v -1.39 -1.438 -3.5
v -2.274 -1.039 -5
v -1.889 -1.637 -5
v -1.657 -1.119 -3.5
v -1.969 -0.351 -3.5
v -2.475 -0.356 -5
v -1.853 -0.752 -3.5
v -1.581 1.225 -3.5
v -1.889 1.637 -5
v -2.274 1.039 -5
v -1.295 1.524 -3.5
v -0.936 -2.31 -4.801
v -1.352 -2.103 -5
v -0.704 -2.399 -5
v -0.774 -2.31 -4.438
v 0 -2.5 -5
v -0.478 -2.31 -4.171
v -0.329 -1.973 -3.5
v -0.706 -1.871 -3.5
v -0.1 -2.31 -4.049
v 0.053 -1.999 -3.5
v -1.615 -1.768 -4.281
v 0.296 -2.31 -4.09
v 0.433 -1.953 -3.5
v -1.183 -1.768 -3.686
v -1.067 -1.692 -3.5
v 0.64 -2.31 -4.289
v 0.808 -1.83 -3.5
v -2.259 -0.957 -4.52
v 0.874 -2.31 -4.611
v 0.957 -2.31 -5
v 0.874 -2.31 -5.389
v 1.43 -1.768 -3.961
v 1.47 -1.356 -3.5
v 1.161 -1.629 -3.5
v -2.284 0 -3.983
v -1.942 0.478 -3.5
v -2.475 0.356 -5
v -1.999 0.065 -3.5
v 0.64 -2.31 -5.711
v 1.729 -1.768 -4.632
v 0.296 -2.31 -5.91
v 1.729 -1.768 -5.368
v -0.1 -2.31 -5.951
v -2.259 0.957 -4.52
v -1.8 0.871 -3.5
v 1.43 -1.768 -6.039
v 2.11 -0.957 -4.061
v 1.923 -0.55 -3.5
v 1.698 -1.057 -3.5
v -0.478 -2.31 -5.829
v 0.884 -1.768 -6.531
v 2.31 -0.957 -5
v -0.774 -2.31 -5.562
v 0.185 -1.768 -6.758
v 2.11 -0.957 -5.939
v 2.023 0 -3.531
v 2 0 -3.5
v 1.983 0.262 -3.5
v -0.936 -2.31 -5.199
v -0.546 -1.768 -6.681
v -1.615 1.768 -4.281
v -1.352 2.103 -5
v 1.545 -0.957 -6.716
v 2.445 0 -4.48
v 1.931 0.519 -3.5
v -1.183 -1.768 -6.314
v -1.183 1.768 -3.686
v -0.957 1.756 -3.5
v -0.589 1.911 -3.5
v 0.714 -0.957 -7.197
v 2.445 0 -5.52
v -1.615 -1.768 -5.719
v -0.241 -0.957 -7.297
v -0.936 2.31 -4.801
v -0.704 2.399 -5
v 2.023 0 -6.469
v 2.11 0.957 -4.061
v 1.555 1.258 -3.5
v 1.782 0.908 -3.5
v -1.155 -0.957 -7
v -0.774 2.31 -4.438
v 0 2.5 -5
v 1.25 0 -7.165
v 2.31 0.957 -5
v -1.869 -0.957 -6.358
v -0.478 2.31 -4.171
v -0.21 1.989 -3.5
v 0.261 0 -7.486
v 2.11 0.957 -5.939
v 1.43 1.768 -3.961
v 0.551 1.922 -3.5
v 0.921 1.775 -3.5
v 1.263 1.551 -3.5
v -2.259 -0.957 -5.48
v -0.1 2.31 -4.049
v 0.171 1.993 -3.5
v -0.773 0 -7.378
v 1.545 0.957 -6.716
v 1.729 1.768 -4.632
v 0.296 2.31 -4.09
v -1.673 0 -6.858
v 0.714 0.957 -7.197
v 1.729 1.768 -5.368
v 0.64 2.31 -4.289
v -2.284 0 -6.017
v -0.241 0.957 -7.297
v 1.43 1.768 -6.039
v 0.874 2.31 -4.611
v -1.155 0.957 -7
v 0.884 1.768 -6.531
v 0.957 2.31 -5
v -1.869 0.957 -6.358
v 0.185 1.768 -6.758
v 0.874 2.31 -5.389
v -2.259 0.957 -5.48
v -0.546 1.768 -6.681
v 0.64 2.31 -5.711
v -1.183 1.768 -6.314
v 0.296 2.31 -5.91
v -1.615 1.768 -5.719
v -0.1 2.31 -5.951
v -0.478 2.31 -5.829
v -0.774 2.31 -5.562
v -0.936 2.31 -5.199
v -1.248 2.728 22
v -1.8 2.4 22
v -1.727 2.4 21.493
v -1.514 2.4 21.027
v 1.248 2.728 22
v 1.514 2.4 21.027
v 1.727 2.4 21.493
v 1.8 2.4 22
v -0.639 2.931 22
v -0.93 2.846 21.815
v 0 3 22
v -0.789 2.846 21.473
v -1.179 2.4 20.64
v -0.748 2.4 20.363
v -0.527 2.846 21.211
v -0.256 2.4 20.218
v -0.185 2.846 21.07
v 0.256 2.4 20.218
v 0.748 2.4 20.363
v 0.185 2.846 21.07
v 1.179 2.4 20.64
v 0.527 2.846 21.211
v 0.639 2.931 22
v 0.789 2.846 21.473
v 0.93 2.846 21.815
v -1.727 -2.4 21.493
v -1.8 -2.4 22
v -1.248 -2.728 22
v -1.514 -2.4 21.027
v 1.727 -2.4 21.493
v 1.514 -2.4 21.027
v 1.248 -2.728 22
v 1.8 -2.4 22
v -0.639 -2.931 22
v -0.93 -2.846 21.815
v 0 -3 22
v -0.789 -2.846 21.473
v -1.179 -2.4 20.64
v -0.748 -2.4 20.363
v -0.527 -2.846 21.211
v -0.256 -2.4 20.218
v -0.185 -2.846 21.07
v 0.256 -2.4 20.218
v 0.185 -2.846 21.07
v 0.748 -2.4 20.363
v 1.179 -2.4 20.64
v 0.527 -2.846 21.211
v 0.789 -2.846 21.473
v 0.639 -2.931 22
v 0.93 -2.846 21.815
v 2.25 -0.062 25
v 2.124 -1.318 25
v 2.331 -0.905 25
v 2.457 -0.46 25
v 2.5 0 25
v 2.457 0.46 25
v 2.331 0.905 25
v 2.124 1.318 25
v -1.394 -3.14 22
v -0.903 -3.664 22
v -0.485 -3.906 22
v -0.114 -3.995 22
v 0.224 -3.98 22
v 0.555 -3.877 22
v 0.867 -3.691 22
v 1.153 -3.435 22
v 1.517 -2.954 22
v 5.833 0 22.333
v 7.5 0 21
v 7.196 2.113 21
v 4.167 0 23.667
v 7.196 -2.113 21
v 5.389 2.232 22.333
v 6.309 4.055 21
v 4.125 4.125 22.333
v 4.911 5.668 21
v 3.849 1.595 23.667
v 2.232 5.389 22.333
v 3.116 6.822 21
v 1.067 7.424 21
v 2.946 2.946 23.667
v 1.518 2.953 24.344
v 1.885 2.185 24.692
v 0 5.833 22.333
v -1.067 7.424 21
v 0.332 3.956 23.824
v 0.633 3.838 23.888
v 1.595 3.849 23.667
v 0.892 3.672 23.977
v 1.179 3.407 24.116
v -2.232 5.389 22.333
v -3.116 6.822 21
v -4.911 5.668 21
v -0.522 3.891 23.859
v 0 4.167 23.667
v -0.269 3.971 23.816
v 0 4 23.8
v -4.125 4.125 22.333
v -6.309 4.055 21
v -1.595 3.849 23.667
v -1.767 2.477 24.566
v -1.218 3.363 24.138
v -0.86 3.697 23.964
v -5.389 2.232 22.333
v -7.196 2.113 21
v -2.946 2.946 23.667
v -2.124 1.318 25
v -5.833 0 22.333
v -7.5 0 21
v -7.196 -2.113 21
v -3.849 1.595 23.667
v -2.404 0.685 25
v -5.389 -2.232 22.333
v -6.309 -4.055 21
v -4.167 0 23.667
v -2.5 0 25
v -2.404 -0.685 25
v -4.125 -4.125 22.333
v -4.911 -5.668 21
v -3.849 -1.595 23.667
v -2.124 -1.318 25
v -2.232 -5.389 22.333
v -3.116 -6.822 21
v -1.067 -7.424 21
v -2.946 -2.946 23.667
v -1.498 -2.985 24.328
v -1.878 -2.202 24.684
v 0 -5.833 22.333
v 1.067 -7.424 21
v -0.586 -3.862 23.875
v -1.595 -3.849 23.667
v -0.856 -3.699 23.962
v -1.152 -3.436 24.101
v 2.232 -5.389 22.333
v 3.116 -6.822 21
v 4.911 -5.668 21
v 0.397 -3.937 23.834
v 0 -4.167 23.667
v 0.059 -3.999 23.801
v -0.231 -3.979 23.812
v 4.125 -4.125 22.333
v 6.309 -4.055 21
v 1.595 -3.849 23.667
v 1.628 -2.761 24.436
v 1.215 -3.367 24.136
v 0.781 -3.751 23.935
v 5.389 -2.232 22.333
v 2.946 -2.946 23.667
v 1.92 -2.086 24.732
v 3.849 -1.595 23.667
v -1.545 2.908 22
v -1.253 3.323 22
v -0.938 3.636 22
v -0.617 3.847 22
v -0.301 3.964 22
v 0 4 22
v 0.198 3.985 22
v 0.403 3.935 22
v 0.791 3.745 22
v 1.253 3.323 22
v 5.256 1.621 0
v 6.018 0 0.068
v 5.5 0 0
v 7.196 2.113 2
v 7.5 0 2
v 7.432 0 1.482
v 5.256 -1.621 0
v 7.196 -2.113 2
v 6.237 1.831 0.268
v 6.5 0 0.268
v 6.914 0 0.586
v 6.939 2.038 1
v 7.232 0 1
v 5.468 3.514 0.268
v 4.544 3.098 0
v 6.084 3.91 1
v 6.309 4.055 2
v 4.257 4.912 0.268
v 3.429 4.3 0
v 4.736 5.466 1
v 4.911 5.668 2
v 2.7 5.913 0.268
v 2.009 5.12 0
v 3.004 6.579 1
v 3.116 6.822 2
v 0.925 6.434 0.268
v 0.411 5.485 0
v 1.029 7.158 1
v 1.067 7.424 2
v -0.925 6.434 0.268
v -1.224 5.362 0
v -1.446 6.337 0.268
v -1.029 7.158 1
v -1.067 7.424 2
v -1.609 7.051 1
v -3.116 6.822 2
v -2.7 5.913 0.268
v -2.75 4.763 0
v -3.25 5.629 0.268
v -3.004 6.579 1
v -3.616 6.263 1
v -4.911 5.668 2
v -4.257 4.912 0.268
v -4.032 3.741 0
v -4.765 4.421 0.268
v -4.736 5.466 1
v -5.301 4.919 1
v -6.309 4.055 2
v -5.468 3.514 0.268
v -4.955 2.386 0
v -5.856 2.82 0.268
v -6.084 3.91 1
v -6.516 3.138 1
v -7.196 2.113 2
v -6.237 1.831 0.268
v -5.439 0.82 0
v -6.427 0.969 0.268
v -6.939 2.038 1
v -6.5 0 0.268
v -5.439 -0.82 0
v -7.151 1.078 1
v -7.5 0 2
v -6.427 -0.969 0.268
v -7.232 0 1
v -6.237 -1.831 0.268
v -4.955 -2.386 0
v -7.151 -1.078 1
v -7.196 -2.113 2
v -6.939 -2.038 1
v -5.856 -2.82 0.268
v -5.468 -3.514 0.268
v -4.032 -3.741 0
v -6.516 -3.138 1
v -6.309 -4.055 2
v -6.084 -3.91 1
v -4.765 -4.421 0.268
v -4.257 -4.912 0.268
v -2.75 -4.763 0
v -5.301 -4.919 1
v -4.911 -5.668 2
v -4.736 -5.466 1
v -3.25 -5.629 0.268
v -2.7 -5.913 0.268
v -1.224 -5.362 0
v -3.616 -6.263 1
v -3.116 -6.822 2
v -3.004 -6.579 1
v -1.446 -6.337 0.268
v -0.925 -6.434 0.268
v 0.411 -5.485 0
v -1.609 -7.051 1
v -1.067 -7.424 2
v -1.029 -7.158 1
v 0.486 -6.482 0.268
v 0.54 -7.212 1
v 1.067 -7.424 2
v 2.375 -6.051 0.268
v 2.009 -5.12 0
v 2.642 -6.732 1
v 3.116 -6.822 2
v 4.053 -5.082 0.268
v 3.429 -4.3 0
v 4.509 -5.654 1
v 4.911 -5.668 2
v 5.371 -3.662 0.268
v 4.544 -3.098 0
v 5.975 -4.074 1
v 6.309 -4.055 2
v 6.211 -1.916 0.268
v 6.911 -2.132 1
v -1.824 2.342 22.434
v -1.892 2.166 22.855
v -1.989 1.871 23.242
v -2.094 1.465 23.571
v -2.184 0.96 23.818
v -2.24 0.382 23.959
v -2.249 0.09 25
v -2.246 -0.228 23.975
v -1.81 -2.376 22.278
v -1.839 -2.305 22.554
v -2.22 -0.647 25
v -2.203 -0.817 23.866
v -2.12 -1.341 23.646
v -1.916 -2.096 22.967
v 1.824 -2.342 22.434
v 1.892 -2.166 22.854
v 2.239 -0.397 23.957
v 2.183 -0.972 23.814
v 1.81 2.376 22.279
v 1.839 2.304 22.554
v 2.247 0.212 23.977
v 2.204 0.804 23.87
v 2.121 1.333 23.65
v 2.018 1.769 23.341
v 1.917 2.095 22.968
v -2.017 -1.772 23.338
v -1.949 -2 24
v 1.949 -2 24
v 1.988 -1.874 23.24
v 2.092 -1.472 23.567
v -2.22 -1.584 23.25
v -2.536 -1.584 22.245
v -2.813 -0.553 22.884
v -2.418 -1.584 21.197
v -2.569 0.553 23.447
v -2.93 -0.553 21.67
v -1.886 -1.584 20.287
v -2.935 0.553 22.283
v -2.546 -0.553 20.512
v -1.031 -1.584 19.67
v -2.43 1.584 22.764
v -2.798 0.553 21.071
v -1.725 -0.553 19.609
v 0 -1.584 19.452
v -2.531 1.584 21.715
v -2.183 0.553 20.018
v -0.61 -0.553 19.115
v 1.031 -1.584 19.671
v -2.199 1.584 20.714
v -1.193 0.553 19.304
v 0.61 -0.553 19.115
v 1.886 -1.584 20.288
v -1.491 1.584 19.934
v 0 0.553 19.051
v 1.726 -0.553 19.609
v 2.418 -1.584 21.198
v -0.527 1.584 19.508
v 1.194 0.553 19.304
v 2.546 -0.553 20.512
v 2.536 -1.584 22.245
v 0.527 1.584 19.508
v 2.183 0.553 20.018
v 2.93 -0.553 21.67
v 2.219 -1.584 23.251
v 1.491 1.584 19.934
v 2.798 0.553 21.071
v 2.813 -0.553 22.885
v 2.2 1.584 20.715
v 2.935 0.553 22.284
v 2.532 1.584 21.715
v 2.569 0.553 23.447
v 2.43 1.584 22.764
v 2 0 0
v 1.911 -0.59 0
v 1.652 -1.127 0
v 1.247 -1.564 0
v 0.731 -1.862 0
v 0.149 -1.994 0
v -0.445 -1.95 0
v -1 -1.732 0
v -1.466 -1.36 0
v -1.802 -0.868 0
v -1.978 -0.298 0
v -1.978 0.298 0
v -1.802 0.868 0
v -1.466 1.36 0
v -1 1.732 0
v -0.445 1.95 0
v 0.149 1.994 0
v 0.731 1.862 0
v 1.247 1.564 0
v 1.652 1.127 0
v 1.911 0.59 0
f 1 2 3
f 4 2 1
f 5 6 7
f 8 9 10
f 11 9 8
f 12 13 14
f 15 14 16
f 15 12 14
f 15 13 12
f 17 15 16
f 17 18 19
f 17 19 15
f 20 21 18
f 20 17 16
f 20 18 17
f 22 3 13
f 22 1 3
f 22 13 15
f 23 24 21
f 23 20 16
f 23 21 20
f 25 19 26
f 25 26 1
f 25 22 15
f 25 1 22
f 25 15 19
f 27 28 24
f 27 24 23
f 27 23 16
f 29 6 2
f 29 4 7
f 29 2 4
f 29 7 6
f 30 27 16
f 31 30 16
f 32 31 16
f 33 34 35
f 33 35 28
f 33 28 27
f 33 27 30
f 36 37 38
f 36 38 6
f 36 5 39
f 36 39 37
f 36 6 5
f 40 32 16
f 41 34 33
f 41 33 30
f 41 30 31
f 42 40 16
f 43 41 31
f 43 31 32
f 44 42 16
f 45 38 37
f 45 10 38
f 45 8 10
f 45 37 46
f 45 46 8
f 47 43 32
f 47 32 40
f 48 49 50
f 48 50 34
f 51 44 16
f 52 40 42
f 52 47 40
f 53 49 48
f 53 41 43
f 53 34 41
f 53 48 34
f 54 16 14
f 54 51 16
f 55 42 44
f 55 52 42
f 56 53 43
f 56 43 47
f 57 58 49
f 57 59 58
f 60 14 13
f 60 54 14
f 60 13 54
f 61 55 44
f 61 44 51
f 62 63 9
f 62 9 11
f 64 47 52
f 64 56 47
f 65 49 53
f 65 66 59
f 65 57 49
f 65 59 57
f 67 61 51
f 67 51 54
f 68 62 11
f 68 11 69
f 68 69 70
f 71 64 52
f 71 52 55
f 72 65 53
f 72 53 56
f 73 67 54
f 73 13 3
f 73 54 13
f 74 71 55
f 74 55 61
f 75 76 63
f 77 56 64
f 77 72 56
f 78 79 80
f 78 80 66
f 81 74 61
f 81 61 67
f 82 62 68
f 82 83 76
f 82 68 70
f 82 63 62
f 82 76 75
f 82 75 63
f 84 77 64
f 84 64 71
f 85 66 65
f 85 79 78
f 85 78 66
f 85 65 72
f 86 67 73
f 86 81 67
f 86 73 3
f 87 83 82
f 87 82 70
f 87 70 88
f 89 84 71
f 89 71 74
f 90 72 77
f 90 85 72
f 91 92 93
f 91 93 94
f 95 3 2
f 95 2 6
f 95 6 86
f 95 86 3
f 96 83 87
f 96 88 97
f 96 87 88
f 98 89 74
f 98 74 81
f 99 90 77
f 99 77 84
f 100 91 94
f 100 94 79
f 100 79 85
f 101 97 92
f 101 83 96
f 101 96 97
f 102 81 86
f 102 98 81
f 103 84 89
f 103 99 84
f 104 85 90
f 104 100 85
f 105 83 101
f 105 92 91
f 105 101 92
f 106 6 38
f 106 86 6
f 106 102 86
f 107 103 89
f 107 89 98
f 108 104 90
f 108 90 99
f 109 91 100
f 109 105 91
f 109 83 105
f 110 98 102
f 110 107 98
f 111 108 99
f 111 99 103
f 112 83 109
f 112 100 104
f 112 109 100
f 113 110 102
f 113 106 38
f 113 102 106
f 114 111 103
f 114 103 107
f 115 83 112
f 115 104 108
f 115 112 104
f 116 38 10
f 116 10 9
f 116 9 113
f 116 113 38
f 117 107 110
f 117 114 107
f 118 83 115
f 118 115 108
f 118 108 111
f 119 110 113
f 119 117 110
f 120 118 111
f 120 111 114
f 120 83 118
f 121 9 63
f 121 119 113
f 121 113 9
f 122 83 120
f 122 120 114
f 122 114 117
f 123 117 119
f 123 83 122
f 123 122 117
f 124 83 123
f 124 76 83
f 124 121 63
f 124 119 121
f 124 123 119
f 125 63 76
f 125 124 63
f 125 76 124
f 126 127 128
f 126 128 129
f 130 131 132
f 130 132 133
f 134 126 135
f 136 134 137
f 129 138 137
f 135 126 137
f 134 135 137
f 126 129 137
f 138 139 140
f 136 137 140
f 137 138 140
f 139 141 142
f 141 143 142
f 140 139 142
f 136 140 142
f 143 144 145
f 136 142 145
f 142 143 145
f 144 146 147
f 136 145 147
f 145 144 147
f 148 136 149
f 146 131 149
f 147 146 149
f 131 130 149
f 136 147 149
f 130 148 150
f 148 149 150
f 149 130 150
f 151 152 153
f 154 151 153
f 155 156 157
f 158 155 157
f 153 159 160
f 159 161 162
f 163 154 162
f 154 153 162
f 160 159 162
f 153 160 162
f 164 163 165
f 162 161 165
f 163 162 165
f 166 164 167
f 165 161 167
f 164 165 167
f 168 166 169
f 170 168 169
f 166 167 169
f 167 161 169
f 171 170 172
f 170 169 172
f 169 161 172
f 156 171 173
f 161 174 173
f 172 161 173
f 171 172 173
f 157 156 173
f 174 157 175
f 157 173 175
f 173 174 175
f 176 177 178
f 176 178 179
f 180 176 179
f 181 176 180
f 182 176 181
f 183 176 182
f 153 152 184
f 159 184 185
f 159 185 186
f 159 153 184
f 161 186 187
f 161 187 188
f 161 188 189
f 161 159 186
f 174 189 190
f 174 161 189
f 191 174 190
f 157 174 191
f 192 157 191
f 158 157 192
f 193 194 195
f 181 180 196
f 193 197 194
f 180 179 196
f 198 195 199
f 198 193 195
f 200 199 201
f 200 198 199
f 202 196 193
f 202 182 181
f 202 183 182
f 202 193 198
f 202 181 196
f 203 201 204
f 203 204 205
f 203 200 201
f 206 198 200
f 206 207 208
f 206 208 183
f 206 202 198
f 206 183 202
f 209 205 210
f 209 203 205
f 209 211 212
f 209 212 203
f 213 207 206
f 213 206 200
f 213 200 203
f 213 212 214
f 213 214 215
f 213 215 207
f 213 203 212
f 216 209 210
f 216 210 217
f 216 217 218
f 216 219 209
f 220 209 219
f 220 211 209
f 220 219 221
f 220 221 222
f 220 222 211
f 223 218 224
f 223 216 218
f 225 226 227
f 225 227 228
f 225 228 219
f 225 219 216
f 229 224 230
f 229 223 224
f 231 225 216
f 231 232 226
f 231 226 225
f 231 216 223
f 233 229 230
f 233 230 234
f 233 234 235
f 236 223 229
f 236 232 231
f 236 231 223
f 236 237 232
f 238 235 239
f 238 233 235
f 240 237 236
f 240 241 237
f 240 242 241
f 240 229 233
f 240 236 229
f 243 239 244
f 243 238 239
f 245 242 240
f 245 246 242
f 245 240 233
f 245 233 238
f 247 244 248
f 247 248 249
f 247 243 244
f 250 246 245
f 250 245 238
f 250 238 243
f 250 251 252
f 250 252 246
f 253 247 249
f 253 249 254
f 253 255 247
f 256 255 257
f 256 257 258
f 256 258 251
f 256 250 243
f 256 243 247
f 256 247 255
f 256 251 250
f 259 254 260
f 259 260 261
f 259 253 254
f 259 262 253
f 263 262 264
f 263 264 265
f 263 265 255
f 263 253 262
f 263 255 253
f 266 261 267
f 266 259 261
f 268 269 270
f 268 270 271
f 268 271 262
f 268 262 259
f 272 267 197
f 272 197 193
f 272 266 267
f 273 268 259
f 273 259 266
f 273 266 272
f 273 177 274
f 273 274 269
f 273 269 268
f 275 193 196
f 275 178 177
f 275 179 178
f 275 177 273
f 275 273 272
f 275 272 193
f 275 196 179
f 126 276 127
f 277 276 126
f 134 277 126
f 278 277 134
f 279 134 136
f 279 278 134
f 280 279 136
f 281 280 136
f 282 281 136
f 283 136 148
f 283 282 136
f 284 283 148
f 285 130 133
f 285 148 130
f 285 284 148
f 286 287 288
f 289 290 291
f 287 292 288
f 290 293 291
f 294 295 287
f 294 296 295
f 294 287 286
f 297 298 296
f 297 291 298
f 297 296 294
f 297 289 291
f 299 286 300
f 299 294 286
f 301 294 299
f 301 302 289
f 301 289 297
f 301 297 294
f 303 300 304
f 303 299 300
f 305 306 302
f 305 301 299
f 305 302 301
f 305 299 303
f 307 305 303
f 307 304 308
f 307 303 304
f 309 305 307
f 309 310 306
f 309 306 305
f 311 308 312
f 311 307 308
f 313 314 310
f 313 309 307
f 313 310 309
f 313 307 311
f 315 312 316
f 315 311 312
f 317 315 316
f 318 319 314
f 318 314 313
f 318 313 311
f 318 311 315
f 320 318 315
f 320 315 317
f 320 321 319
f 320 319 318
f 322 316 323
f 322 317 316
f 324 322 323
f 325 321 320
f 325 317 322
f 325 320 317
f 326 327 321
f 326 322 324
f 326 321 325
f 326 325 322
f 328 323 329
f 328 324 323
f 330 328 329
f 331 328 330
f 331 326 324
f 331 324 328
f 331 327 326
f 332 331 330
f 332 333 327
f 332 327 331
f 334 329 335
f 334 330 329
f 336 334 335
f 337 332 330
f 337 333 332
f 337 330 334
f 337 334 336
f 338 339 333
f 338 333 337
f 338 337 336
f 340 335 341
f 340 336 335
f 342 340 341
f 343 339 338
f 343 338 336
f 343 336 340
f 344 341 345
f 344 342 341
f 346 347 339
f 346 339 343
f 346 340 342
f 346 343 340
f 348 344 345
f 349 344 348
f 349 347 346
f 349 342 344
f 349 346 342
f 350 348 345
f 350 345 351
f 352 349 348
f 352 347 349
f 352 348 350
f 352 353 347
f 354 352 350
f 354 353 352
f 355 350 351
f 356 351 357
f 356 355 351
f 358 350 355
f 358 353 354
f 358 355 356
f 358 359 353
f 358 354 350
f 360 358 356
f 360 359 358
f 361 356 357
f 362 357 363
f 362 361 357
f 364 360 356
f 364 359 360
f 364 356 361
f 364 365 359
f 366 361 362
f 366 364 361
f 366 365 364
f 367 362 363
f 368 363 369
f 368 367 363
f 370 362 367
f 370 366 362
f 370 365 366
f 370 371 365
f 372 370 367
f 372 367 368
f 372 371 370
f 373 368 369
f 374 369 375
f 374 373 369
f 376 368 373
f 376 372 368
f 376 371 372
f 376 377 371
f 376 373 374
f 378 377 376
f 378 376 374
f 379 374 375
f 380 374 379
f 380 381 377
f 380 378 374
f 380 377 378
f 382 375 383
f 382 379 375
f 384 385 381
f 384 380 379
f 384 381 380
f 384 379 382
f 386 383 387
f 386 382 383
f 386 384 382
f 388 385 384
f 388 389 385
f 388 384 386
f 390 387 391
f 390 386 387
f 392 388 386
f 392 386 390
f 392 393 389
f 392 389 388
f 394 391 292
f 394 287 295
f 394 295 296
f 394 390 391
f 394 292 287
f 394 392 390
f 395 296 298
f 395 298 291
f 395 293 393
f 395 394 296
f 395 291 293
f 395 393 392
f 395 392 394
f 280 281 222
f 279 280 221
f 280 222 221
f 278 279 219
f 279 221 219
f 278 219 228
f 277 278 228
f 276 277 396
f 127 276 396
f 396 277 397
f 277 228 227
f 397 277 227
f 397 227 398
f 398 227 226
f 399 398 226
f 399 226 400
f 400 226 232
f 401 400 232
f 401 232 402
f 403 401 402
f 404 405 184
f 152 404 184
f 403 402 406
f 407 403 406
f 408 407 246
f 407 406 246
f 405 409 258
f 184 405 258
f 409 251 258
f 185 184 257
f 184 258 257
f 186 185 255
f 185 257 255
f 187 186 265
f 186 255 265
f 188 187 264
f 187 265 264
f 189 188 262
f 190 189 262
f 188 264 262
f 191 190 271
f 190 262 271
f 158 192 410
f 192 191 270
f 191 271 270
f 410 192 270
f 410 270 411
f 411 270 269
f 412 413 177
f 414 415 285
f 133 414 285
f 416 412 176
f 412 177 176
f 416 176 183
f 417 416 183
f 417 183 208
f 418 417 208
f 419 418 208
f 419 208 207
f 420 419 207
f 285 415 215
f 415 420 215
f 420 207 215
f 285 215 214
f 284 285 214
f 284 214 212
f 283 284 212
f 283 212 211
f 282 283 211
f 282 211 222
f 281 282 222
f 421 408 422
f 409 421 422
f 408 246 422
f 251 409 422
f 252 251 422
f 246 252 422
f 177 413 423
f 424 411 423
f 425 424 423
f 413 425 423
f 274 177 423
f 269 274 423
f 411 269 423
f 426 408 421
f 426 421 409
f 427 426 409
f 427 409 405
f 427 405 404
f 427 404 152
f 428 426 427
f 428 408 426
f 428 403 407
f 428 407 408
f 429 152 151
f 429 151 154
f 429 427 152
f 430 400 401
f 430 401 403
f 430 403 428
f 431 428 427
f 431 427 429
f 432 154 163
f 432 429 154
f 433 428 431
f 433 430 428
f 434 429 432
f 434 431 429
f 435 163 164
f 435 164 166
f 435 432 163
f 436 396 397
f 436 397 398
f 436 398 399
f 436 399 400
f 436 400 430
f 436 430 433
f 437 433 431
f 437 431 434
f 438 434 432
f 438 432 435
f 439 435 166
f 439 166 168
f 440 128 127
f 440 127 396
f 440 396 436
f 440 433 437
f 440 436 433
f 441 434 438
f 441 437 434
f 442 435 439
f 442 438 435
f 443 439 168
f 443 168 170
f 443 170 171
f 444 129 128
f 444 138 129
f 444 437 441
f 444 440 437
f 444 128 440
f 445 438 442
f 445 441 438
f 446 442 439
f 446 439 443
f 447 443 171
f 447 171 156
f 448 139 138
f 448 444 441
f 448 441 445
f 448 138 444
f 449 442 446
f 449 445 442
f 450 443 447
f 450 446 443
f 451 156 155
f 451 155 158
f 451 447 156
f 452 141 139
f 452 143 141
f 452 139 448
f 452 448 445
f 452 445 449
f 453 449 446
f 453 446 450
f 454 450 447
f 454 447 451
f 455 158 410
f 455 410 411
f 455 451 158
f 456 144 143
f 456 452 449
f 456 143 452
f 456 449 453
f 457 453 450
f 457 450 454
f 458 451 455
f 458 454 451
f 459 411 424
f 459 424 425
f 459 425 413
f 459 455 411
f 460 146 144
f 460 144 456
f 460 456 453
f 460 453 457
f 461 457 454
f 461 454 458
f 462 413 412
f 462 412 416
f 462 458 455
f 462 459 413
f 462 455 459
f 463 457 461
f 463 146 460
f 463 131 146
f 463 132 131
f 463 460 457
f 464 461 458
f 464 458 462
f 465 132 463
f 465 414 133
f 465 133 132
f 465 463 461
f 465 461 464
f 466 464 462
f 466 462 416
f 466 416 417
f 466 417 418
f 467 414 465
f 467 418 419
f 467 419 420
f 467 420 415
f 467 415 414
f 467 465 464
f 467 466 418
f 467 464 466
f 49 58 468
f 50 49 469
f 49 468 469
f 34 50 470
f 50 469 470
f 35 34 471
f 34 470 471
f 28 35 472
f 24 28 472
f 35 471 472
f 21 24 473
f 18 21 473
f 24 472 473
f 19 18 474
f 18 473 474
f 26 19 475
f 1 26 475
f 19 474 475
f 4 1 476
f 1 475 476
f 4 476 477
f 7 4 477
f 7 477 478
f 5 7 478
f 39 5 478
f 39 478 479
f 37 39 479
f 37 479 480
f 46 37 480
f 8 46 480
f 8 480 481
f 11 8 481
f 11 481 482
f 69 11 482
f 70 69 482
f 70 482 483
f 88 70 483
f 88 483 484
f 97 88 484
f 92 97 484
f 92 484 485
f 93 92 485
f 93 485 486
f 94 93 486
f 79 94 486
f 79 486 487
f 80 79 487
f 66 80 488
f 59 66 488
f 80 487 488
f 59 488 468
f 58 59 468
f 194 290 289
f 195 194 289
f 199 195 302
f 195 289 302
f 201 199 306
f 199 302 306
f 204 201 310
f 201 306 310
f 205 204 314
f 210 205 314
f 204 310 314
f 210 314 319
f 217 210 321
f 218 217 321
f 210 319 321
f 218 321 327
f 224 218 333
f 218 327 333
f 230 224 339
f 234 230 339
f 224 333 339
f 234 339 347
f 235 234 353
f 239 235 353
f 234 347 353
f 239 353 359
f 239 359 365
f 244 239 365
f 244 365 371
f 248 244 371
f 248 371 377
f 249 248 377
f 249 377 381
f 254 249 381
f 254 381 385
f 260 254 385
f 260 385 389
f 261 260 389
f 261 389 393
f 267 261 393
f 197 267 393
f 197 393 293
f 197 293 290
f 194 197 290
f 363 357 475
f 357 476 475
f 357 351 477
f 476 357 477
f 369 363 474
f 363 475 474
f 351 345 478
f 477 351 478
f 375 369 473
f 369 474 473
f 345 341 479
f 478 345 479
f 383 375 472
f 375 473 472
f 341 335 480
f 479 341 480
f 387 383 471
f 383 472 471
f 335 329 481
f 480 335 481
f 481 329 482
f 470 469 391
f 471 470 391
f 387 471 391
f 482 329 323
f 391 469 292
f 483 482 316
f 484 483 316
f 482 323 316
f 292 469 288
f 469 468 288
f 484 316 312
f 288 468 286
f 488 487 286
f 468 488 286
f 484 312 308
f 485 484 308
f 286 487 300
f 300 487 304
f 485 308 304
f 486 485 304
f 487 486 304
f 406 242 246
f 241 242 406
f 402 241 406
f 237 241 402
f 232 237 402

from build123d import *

# Parameters (mm, degrees)
F0_R     = 7.5
F1_DEPTH = 25
F2_R     = 2
F3_DEPTH = 5
F7_DEPTH = 3
F11_R    = 2


# Not quite as in the source:
# - a fillet or chamfer that OpenCascade refuses, or shapes differently, is made with other operations: its cross-section is extruded or revolved along the edge and cut away or added


with BuildPart() as f1:
    # F0 (on Top) → F1 (new body)
    with BuildSketch(Plane.XY):
        Circle(F0_R)
    extrude(amount=F1_DEPTH)

    # F2 (on face) → F3 (join)
    with BuildSketch(Plane(origin=(0, 0, 0), x_dir=(1, 0, 0), z_dir=(0, 0, -1))):
        Circle(F2_R)
    extrude(amount=F3_DEPTH)

    # F4 (on face) → F5 (revolve)
    with BuildSketch(Plane(origin=(0, 0, -5), x_dir=(1, 0, 0), z_dir=(0, 0, -1))):
        with BuildLine():
            Line((0, 2), (0, 2.5))
            ThreePointArc((0, 2.5), (-2.5, 0), (0, -2.5))
            Line((0, -2.5), (0, -2))
            ThreePointArc((0, -2), (-2, 0), (0, 2))
        make_face()
        with BuildLine():
            Line((0, -2), (0, 2))
            ThreePointArc((0, 2), (-2, 0), (0, -2))
        make_face()
    revolve(axis=Axis((0, 0, -5), (0, 1, 0)))

    # F6 (on face) → F7 (cut)
    with BuildSketch(Plane.XY.offset(25)):
        with BuildLine():
            add(Edge.make_bspline(
                [(0, 4), (-3.897114317, 4), (-1.9485571585, -2), (0, -8), (1.9485571585, -2), (3.897114317, 4), (0, 4)],
                knots=[0, 0, 0, 2.0943951024, 2.0943951024, 4.1887902048, 4.1887902048, 6.2831853072, 6.2831853072, 6.2831853072], degree=2, weights=[1, 0.5, 1, 0.5, 1, 0.5, 1]))
        make_face()
    extrude(amount=-F7_DEPTH, mode=Mode.SUBTRACT)

    # F8 (on face) → F9 (revolve, cut)
    with BuildSketch(Plane.XY.offset(22)):
        with BuildLine():
            ThreePointArc((1.8, -2.4), (2.683281573, -1.3416407865), (3, 0))
            ThreePointArc((3, 0), (2.683281573, 1.3416407865), (1.8, 2.4))
            add(Edge.make_bspline(
                [(1.8, -2.4), (1.8810311774, -2.2079260981), (1.9485571585, -2), (2.6913429511, 0.2871870789), (1.8, 2.4)],
                knots=[4.0484923357, 4.0484923357, 4.0484923357, 4.1887902048, 4.1887902048, 5.3448576064, 5.3448576064, 5.3448576064], degree=2, weights=[0.9375, 0.9665063509, 1, 0.7240092377, 0.7527020789]))
        make_face()
        with BuildLine():
            Line((0, -3), (0, 3))
            ThreePointArc((0, 3), (-0.9486832981, 2.8460498942), (-1.8, 2.4))
            add(Edge.make_bspline(
                [(-1.8, 2.4), (-2.6913429511, 0.2871870789), (-1.9485571585, -2), (-1.8810311774, -2.2079260981), (-1.8, -2.4)],
                knots=[0.9383277008, 0.9383277008, 0.9383277008, 2.0943951024, 2.0943951024, 2.2346929715, 2.2346929715, 2.2346929715], degree=2, weights=[0.7527020789, 0.7240092377, 1, 0.9665063509, 0.9375]))
            ThreePointArc((-1.8, -2.4), (-0.9486832981, -2.8460498942), (0, -3))
        make_face()
    revolve(axis=Axis((0, 0, 22), (0, -1, 0)), mode=Mode.SUBTRACT)

    # F10: chamfer of 5 x 4 on 1 edges, made by hand

    # F10_s1 → F10_t2 (revolve, cut)
    with BuildSketch(Plane.XZ):
        Polygon((7.5, 21), (2.5, 25), (7.5, 25), align=None)
    revolve(axis=Axis((0, 0, 25), (0, 0, 1)), mode=Mode.SUBTRACT)

    # F11
    f11_edges = [f1.edges().sort_by_distance(p)[0] for p in [
        (-7.5, 0, 0),
    ]]
    fillet(f11_edges, radius=F11_R)


solid = f1.part
